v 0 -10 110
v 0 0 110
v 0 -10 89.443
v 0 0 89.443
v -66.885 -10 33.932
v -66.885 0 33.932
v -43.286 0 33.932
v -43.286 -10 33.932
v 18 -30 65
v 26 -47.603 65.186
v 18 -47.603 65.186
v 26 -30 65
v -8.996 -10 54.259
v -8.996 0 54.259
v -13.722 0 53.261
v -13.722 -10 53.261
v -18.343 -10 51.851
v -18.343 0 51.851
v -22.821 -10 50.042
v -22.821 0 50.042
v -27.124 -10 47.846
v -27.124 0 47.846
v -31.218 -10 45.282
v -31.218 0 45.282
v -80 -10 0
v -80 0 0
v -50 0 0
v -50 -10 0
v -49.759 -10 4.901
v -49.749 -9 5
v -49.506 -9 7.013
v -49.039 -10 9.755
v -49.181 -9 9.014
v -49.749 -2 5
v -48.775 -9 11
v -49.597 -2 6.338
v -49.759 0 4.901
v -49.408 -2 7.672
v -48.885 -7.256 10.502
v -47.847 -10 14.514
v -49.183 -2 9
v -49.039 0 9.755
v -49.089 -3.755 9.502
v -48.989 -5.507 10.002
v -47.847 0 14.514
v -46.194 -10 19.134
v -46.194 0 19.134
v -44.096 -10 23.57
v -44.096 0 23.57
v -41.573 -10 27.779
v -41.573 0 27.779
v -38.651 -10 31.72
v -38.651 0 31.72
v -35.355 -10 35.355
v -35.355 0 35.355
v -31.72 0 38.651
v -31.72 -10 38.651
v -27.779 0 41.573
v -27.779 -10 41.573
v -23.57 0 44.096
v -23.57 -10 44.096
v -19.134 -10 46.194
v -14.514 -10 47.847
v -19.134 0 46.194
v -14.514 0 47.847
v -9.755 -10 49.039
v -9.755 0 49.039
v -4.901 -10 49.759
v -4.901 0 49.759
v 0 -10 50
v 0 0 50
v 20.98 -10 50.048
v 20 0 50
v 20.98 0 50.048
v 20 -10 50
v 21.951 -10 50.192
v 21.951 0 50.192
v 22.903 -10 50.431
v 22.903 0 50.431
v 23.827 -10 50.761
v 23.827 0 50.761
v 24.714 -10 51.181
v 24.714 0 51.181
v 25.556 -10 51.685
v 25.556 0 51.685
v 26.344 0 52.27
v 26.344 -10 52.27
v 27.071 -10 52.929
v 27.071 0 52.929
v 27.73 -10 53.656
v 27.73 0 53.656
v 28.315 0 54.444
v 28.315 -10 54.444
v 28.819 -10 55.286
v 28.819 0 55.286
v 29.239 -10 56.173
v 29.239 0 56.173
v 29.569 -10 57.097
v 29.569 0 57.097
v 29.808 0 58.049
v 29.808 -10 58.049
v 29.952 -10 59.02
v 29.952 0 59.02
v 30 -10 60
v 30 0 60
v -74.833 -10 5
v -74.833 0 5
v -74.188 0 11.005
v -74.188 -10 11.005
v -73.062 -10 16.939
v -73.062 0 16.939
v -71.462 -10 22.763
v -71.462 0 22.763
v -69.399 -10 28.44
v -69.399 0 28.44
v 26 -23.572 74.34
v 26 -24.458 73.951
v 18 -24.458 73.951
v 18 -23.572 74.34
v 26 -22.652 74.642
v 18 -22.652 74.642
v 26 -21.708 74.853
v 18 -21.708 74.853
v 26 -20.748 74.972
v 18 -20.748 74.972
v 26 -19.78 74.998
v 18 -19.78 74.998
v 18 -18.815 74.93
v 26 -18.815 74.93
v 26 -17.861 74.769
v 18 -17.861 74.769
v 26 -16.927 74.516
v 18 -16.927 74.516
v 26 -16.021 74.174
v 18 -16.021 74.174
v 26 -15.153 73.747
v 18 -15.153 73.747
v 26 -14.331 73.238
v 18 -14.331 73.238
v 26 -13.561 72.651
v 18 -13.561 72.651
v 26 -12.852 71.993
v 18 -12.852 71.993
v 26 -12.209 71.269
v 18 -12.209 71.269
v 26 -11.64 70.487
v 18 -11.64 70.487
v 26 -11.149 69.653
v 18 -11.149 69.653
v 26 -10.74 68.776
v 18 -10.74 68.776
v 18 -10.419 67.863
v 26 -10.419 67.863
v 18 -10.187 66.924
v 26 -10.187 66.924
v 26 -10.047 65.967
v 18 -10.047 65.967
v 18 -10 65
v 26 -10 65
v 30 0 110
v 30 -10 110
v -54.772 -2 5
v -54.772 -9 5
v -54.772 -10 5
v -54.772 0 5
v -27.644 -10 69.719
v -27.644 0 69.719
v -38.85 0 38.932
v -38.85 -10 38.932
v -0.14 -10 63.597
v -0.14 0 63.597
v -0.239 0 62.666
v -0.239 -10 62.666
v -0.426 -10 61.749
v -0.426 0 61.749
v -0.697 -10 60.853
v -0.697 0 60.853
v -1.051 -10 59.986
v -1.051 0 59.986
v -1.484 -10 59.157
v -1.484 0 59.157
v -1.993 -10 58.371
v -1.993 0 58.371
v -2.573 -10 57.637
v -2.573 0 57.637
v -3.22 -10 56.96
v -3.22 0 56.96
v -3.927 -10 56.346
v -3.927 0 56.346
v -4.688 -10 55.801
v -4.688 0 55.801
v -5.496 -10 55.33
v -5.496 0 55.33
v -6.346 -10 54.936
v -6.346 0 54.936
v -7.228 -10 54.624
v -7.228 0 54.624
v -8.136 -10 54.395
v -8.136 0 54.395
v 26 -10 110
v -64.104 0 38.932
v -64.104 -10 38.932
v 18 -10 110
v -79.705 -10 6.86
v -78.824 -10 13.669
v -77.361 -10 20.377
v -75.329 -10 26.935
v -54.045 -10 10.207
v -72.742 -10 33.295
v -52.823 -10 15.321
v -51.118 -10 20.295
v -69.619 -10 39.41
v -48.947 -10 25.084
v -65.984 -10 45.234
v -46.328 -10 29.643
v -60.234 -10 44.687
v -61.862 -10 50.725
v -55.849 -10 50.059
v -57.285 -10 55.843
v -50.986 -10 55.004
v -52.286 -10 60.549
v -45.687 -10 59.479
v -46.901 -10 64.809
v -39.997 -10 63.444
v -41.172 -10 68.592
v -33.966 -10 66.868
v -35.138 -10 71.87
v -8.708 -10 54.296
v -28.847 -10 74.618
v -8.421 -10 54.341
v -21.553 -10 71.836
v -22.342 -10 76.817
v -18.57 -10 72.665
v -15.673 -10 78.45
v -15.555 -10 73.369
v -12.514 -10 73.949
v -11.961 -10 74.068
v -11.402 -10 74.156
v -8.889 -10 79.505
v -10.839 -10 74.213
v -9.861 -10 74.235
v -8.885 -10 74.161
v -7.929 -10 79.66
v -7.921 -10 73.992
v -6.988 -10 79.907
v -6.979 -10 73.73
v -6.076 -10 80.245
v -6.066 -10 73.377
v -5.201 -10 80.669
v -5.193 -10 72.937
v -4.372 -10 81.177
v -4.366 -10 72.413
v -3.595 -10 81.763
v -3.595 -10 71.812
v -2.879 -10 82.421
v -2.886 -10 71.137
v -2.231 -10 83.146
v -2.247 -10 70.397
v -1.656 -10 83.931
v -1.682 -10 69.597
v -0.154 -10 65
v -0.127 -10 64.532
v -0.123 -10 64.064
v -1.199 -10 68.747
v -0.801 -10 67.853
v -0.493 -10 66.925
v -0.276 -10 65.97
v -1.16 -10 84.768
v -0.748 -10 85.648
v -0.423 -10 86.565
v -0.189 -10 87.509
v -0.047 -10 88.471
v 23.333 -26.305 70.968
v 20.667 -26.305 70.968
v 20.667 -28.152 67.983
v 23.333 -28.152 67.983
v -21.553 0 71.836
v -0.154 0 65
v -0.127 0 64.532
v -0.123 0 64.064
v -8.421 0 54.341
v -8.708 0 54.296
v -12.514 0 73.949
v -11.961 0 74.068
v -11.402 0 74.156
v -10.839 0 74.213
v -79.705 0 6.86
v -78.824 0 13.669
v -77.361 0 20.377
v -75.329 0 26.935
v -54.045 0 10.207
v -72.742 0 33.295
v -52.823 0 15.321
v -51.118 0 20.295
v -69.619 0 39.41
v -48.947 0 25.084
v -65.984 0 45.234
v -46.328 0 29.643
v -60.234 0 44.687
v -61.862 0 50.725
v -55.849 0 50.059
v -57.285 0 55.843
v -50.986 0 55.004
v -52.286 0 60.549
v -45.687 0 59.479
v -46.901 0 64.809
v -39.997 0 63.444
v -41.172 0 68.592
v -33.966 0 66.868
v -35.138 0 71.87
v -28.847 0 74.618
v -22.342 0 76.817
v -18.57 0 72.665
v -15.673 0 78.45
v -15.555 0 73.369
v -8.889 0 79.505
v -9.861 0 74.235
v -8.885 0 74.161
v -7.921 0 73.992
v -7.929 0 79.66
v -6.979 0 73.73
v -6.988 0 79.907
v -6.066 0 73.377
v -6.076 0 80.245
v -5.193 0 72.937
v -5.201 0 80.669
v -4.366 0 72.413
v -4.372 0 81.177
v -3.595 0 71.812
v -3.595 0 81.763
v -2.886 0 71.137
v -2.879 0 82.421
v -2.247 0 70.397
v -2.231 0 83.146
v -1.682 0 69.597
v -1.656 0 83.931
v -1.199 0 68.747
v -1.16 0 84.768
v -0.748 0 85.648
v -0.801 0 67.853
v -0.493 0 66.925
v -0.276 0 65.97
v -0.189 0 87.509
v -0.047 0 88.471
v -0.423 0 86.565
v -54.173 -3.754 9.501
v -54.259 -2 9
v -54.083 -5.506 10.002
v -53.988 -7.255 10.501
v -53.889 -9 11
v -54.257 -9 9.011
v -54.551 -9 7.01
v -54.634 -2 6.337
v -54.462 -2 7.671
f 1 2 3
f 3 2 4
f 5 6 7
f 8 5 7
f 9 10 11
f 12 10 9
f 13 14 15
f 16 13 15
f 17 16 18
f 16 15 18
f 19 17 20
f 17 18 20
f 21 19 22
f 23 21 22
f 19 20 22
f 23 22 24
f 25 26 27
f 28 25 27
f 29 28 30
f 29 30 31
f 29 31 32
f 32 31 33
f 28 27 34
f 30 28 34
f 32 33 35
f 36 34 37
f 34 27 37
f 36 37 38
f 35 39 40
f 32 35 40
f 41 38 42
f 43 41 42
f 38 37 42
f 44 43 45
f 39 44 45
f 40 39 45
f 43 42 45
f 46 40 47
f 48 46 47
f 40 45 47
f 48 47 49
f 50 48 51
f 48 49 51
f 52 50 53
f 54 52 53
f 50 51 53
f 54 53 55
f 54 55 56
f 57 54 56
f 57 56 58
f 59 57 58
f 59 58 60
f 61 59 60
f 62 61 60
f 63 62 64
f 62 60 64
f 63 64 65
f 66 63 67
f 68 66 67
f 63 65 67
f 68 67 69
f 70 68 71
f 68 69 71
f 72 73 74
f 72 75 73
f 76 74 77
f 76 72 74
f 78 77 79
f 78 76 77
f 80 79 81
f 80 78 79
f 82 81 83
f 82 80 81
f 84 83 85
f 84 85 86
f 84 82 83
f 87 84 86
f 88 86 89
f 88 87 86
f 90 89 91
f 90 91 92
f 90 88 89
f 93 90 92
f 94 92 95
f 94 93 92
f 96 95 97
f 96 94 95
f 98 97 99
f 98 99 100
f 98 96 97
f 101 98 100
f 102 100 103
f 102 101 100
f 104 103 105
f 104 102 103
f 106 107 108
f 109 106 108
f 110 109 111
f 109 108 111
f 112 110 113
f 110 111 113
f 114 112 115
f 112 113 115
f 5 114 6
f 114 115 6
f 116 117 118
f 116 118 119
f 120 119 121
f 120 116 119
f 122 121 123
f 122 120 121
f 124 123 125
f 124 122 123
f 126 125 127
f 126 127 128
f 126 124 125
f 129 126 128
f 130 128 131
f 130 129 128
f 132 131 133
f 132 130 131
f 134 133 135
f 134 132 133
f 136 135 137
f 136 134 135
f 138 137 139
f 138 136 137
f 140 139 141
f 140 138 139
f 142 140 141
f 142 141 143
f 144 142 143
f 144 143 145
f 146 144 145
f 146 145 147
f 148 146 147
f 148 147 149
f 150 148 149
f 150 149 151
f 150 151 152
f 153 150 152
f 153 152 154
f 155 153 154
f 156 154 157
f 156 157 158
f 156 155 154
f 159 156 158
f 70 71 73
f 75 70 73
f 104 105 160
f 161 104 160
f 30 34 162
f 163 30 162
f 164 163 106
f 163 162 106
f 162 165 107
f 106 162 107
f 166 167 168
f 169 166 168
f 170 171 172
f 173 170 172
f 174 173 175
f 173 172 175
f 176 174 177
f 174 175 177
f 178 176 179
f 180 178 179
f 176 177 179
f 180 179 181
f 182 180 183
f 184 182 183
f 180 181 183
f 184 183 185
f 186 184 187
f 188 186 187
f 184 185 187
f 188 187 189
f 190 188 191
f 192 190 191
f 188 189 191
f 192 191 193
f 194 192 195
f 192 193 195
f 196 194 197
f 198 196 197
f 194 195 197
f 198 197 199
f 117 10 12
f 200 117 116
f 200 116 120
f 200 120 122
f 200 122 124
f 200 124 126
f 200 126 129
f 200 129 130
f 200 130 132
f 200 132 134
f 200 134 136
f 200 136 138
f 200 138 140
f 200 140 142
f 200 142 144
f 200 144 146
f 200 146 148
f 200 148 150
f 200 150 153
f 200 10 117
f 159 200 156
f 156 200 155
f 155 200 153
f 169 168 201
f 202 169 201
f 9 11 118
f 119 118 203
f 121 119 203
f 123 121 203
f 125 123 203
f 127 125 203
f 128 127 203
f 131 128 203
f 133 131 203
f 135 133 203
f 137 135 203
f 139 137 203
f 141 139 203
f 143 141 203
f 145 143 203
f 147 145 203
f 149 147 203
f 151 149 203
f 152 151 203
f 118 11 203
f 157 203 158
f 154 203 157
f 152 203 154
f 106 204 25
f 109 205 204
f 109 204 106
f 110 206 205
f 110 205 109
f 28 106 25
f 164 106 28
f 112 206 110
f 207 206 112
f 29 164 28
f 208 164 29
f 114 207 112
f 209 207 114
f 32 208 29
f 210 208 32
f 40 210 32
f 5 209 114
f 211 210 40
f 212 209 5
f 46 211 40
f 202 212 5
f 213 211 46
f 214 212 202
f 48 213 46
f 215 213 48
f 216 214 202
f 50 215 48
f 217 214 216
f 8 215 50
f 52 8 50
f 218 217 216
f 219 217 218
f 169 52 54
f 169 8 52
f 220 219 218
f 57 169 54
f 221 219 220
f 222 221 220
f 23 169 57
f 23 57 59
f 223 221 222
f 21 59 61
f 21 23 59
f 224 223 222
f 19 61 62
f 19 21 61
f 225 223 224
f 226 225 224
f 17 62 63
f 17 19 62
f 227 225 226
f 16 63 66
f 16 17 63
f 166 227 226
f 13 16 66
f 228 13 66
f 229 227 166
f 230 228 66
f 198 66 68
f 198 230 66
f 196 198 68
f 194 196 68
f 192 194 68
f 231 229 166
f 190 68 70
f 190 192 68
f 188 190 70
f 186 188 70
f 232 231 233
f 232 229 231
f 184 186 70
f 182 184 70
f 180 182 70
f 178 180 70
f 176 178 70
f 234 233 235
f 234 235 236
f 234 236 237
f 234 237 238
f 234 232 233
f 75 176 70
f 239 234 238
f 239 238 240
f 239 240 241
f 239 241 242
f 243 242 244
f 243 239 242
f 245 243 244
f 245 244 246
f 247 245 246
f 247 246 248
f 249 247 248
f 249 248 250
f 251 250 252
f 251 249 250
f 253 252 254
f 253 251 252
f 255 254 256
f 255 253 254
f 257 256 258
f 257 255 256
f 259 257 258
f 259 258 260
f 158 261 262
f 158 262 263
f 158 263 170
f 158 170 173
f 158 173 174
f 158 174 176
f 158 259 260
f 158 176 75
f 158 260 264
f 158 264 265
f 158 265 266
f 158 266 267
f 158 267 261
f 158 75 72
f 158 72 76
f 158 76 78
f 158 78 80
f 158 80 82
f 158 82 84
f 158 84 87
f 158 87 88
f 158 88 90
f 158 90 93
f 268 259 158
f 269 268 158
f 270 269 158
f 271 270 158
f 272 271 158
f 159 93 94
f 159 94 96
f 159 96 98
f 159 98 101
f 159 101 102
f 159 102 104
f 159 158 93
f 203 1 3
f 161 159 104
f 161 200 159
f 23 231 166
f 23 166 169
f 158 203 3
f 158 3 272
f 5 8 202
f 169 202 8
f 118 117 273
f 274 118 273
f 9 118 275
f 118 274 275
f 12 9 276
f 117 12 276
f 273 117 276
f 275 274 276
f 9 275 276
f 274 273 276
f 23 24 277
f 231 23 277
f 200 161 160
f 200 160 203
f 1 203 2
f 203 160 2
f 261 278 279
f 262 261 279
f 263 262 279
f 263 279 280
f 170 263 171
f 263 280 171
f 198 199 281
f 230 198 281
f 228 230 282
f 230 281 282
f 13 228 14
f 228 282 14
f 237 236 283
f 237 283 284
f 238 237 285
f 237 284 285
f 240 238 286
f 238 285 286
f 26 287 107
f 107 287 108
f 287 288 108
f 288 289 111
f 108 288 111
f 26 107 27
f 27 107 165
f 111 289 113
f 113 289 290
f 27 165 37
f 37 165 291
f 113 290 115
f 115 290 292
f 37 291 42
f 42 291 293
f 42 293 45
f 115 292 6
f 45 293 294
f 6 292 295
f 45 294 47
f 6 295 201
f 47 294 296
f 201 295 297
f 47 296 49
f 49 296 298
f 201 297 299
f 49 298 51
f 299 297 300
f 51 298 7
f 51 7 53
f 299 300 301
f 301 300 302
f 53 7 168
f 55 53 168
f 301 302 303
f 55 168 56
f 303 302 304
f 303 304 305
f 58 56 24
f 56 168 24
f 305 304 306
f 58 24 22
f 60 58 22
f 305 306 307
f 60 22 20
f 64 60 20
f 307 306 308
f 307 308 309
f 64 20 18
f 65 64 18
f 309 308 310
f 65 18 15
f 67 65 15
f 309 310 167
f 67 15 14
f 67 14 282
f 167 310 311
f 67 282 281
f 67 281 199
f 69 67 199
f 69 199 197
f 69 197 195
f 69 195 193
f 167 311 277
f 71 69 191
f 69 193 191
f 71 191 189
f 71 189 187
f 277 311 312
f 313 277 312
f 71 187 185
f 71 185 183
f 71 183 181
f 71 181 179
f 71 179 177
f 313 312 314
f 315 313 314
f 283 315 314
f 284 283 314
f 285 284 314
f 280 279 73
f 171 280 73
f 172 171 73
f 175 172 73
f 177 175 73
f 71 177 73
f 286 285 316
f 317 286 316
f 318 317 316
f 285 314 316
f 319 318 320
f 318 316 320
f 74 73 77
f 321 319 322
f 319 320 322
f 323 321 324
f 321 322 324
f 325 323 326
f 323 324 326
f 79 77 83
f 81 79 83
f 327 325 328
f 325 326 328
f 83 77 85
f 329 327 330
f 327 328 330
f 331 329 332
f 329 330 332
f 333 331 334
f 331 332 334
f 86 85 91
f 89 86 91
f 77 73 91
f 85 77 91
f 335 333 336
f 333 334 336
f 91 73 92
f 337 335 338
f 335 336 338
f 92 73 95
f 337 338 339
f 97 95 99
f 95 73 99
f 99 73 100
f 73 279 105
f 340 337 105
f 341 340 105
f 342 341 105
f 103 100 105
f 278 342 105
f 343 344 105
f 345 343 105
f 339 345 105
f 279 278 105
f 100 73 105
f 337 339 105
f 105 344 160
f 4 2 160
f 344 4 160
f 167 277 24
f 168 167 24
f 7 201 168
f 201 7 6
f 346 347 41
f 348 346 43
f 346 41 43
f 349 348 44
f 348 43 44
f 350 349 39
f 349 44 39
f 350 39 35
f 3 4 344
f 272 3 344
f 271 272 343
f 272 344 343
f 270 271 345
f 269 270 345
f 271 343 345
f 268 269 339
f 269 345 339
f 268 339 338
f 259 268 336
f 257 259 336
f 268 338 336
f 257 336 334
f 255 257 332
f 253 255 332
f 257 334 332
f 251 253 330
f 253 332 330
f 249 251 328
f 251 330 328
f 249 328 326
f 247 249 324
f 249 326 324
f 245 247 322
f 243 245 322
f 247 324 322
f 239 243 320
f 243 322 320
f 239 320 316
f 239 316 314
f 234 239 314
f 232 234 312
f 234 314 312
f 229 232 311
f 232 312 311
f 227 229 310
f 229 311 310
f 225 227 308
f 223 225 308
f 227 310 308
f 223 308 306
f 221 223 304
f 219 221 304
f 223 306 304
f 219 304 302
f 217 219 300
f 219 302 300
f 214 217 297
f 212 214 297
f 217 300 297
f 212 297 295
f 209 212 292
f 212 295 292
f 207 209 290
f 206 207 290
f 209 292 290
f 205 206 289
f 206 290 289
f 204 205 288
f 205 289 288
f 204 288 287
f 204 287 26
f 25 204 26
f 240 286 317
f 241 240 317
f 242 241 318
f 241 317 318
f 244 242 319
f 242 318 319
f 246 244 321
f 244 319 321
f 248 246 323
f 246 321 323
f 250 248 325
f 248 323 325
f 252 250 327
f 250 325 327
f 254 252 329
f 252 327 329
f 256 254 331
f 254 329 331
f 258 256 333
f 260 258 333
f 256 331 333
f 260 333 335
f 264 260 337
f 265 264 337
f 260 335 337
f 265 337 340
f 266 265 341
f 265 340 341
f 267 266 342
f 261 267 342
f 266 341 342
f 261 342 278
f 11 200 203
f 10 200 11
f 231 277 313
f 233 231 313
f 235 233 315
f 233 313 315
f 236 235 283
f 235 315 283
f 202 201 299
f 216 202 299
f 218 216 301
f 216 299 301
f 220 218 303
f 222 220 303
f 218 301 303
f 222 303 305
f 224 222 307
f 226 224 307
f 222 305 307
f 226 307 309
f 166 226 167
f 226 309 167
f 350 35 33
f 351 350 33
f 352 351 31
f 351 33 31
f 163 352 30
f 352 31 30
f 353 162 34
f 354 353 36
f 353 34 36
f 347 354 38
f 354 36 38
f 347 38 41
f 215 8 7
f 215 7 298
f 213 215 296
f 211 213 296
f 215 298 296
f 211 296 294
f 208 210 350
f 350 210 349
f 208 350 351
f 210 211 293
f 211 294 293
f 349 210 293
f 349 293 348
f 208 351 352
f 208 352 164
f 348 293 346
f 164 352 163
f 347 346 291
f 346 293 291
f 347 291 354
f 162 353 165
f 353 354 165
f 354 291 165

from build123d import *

# Parameters (mm, degrees)
F1_DEPTH = 10
F2_R     = 10
F4_DEPTH = 55
F6_START = -4
F6_DEPTH = 8


# Not quite as in the source:
# - a feature names something its author has since deleted; it is built from what else it names


with BuildPart() as f1:
    # F0 (on Front) → F1 (new body)
    with BuildSketch(Plane.XZ):
        with BuildLine():
            ThreePointArc((-50, 0), (-35.3553390593, 35.3553390593), (0, 50))
            Line((0, 50), (30, 50))
            Line((30, 50), (30, 110))
            Line((30, 110), (0, 110))
            Line((0, 110), (0, 89.4427191))
            ThreePointArc((0, 89.4427191), (-2.546440075, 82.7760524333), (-8.8888888889, 79.5046392))
            ThreePointArc((-8.8888888889, 79.5046392), (-59.6284794, 53.3333333333), (-80, 0))
            Line((-80, 0), (-50, 0))
        make_face()
        with BuildLine():
            Line((-0.1396715456, 63.5967118692), (-0.0513620047, 54.9999760177))
            ThreePointArc((-0.0513620047, 54.9999760177), (-4.1045972669, 54.8466250673), (-8.135508632, 54.3949767837))
            ThreePointArc((-8.135508632, 54.3949767837), (-8.5642581923, 54.317769449), (-8.9959636029, 54.2593092368))
            ThreePointArc((-8.9959636029, 54.2593092368), (-20.6018520556, 50.99572229), (-31.2178460585, 45.2818516347))
            ThreePointArc((-31.2178460585, 45.2818516347), (-35.1775050235, 42.2793464983), (-38.85, 38.9317030195))
            ThreePointArc((-38.85, 38.9317030195), (-41.1438023454, 36.4991442169), (-43.2855579864, 33.9317030195))
            ThreePointArc((-43.2855579864, 33.9317030195), (-51.1184366801, 20.2954534658), (-54.7722557505, 5))
            Line((-54.7722557505, 5), (-74.8331477355, 5))
            ThreePointArc((-74.8331477355, 5), (-72.3207331298, 19.8673490824), (-66.8852713996, 33.9317030195))
            ThreePointArc((-66.8852713996, 33.9317030195), (-65.5423309322, 36.4582344057), (-64.1039975353, 38.9317030195))
            ThreePointArc((-64.1039975353, 38.9317030195), (-48.3880483763, 57.3026768513), (-27.6441832414, 69.7194315304))
            ThreePointArc((-27.6441832414, 69.7194315304), (-24.6212334453, 70.8434532164), (-21.5527545012, 71.8364724455))
            ThreePointArc((-21.5527545012, 71.8364724455), (-17.0660687419, 73.0325221918), (-12.5139679551, 73.9486349165))
            ThreePointArc((-12.5139679551, 73.9486349165), (-11.6819966677, 74.1162256952), (-10.8388112367, 74.2126685343))
            ThreePointArc((-10.8388112367, 74.2126685343), (-5.5617429138, 74.7934958119), (-0.2568067386, 74.999560334))
            Line((-0.2568067386, 74.999560334), (-0.1540837044, 64.9997032265))
            ThreePointArc((-0.1540837044, 64.9997032265), (-0.1222411681, 64.2984606247), (-0.1396715456, 63.5967118692))
        make_face(mode=Mode.SUBTRACT)
        with BuildLine():
            ThreePointArc((-38.85, 38.9317030195), (-35.1775050235, 42.2793464983), (-31.2178460585, 45.2818516347))
            Line((-31.2178460585, 45.2818516347), (-21.5527545012, 71.8364724455))
            ThreePointArc((-21.5527545012, 71.8364724455), (-24.6212334453, 70.8434532164), (-27.6441832414, 69.7194315304))
            Line((-27.6441832414, 69.7194315304), (-38.85, 38.9317030195))
        make_face()
        with BuildLine():
            ThreePointArc((-43.2855579864, 33.9317030195), (-41.1438023454, 36.4991442169), (-38.85, 38.9317030195))
            Line((-38.85, 38.9317030195), (-64.1039975353, 38.9317030195))
            ThreePointArc((-64.1039975353, 38.9317030195), (-65.5423309322, 36.4582344057), (-66.8852713996, 33.9317030195))
            Line((-66.8852713996, 33.9317030195), (-43.2855579864, 33.9317030195))
        make_face()
        with BuildLine():
            ThreePointArc((-10.8388112367, 74.2126685343), (-3.5948385174, 71.8115750097), (-0.1540837044, 64.9997032265))
            Line((-0.1540837044, 64.9997032265), (-0.2568067386, 74.999560334))
            ThreePointArc((-0.2568067386, 74.999560334), (-5.5617429138, 74.7934958119), (-10.8388112367, 74.2126685343))
        make_face()
        with BuildLine():
            ThreePointArc((-8.135508632, 54.3949767837), (-4.1045972669, 54.8466250673), (-0.0513620047, 54.9999760177))
            Line((-0.0513620047, 54.9999760177), (-0.1396715456, 63.5967118692))
            ThreePointArc((-0.1396715456, 63.5967118692), (-2.5733550789, 57.6366041193), (-8.135508632, 54.3949767837))
        make_face()
    extrude(amount=F1_DEPTH)

    # F2
    f2_edges = [f1.edges().sort_by_distance(p)[0] for p in [
        (30, -5, 50),
    ]]
    fillet(f2_edges, radius=F2_R)

    # F3 (on Right) → F4 (cut)
    with BuildSketch(Plane.YZ):
        Polygon((-9, 11), (-9, 5), (-2, 5), (-2, 9), align=None)
    extrude(amount=-F4_DEPTH, mode=Mode.SUBTRACT)

    # F5 (on face) → F6 (join)
    with BuildSketch(Plane.YZ.offset(30).offset(F6_START)):
        with BuildLine():
            Line((-10, 65), (-10, 110))
            Line((-10, 110), (-47.6030751667, 65.1864000775))
            Line((-47.6030751667, 65.1864000775), (-30, 65))
            ThreePointArc((-30, 65), (-28.5022679561, 70.2641656131), (-24.4577120796, 73.9514693216))
            ThreePointArc((-24.4577120796, 73.9514693216), (-14.7358343869, 73.5022679561), (-10, 65))
        make_face()
        with BuildLine():
            ThreePointArc((-24.4577120796, 73.9514693216), (-28.5022679561, 70.2641656131), (-30, 65))
            add(Edge.make_bspline(
                [(-24.4577120796, 73.9514693216), (-26.3063166684, 70.9700062817), (-28.1513954112, 67.9814630399), (-30, 65)],
                knots=[0, 0, 0, 0, 10.5283312262, 10.5283312262, 10.5283312262, 10.5283312262], degree=3))
        make_face()
    extrude(amount=-F6_DEPTH)


solid = f1.part
